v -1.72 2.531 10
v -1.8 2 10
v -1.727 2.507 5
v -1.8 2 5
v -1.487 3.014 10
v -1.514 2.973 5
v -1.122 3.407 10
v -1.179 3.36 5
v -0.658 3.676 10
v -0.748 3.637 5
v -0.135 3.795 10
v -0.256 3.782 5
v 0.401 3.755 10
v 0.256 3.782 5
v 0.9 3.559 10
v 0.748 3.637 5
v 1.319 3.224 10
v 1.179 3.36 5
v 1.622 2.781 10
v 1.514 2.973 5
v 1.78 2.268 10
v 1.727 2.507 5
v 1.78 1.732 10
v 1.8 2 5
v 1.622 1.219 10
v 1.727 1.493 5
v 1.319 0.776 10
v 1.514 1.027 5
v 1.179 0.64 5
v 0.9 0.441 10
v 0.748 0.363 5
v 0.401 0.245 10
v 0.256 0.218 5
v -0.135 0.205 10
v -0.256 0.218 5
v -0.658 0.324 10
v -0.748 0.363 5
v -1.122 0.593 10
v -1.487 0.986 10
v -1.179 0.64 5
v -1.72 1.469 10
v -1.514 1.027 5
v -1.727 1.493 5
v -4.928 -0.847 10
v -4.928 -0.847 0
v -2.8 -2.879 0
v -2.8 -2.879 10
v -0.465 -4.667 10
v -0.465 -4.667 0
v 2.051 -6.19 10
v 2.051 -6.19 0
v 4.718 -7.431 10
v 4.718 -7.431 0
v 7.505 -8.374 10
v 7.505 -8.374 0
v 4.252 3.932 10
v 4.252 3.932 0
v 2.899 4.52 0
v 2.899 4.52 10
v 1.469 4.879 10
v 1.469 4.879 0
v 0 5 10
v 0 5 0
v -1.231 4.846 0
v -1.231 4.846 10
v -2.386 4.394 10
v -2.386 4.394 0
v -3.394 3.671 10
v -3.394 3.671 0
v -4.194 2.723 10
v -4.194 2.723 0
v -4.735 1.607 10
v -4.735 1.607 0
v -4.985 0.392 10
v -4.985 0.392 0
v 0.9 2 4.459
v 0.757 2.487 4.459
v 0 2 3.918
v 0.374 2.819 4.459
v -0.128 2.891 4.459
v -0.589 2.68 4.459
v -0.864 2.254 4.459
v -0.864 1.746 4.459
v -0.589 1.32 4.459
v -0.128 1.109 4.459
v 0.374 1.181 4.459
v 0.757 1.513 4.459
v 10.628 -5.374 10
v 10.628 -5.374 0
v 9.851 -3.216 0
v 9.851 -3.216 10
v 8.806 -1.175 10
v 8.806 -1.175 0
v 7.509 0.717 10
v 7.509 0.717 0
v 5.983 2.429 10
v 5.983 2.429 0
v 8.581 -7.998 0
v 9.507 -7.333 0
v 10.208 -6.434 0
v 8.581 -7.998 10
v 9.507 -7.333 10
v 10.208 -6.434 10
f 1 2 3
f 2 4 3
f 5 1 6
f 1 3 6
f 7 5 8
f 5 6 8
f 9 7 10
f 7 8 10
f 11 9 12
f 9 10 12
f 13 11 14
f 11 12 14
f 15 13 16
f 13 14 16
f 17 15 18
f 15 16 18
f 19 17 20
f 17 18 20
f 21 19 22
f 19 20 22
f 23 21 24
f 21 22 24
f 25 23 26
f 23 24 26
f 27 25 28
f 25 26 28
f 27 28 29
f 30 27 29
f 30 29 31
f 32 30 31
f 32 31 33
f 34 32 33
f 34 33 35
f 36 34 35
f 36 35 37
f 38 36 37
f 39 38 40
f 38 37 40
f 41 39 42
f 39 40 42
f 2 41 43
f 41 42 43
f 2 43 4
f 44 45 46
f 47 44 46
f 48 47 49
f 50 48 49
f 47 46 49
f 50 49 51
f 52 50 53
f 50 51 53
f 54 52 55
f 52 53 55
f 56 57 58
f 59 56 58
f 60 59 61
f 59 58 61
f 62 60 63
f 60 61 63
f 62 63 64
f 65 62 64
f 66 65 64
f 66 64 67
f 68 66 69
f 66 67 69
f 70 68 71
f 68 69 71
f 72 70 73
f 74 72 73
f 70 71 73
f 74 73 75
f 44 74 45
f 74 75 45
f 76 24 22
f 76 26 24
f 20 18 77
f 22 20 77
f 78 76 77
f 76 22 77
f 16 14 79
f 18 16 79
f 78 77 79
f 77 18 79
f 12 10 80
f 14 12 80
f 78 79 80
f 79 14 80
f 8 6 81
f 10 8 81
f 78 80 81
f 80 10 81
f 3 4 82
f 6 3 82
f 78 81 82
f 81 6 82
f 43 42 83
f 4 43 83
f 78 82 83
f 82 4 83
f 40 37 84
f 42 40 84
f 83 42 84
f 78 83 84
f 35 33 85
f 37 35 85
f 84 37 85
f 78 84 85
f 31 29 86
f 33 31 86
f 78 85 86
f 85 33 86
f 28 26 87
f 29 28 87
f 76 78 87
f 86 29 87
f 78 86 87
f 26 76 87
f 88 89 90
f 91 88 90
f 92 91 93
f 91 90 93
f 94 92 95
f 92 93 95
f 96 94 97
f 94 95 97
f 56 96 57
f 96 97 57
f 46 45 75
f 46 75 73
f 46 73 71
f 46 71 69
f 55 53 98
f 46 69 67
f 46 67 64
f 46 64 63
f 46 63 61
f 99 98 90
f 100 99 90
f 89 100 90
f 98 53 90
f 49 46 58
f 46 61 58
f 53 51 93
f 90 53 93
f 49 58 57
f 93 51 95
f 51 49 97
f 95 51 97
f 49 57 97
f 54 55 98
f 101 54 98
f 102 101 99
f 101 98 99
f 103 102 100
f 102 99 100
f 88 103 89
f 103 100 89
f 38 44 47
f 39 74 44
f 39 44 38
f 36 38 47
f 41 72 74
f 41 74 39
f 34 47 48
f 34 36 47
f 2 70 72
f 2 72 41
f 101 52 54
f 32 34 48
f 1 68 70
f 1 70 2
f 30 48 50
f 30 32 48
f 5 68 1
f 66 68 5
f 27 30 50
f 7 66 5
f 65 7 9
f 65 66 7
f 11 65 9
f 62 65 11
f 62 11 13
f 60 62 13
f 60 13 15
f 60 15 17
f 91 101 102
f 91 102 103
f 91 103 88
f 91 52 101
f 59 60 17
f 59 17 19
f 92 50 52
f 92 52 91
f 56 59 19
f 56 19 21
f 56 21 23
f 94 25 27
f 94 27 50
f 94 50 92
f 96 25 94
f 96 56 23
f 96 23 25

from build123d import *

# Parameters (mm, degrees)
BOSS_EXTRUDE3_DEPTH      = 10
M3_CLEARANCE_HOLE1_D     = 3.6
M3_CLEARANCE_HOLE1_DEPTH = 5
M3_CLEARANCE_HOLE1_TIP   = 1.081549114


with BuildPart() as part:
    # Sketch3 → Boss-Extrude3 (new body)
    with BuildSketch(Plane.XY):
        with BuildLine():
            ThreePointArc((10.627637959, -5.374147741), (8.187588203, -0.208463055), (4.251688797, 3.93241088))
            ThreePointArc((4.251688797, 3.93241088), (2.191837366, 4.729023368), (0, 5))
            ThreePointArc((0, 5), (-3.823420235, 3.222026956), (-4.927665225, -0.847416917))
            ThreePointArc((-4.927665225, -0.847416917), (0.77252532, -5.462986054), (7.504596942, -8.374147741))
            ThreePointArc((7.504596942, -8.374147741), (9.507210052, -7.33333117), (10.627637959, -5.374147741))
        make_face()
    extrude(amount=BOSS_EXTRUDE3_DEPTH)

    # M3 Clearance Hole1
    with Locations(Plane.XY.offset(10)):
        with Locations((0, 2)):
            Hole(M3_CLEARANCE_HOLE1_D / 2, depth=M3_CLEARANCE_HOLE1_DEPTH)
            with Locations((0, 0, -(M3_CLEARANCE_HOLE1_DEPTH + M3_CLEARANCE_HOLE1_TIP / 2))):  # 118° drill point
                Cone(0, M3_CLEARANCE_HOLE1_D / 2, M3_CLEARANCE_HOLE1_TIP, mode=Mode.SUBTRACT)


solid = part.part
